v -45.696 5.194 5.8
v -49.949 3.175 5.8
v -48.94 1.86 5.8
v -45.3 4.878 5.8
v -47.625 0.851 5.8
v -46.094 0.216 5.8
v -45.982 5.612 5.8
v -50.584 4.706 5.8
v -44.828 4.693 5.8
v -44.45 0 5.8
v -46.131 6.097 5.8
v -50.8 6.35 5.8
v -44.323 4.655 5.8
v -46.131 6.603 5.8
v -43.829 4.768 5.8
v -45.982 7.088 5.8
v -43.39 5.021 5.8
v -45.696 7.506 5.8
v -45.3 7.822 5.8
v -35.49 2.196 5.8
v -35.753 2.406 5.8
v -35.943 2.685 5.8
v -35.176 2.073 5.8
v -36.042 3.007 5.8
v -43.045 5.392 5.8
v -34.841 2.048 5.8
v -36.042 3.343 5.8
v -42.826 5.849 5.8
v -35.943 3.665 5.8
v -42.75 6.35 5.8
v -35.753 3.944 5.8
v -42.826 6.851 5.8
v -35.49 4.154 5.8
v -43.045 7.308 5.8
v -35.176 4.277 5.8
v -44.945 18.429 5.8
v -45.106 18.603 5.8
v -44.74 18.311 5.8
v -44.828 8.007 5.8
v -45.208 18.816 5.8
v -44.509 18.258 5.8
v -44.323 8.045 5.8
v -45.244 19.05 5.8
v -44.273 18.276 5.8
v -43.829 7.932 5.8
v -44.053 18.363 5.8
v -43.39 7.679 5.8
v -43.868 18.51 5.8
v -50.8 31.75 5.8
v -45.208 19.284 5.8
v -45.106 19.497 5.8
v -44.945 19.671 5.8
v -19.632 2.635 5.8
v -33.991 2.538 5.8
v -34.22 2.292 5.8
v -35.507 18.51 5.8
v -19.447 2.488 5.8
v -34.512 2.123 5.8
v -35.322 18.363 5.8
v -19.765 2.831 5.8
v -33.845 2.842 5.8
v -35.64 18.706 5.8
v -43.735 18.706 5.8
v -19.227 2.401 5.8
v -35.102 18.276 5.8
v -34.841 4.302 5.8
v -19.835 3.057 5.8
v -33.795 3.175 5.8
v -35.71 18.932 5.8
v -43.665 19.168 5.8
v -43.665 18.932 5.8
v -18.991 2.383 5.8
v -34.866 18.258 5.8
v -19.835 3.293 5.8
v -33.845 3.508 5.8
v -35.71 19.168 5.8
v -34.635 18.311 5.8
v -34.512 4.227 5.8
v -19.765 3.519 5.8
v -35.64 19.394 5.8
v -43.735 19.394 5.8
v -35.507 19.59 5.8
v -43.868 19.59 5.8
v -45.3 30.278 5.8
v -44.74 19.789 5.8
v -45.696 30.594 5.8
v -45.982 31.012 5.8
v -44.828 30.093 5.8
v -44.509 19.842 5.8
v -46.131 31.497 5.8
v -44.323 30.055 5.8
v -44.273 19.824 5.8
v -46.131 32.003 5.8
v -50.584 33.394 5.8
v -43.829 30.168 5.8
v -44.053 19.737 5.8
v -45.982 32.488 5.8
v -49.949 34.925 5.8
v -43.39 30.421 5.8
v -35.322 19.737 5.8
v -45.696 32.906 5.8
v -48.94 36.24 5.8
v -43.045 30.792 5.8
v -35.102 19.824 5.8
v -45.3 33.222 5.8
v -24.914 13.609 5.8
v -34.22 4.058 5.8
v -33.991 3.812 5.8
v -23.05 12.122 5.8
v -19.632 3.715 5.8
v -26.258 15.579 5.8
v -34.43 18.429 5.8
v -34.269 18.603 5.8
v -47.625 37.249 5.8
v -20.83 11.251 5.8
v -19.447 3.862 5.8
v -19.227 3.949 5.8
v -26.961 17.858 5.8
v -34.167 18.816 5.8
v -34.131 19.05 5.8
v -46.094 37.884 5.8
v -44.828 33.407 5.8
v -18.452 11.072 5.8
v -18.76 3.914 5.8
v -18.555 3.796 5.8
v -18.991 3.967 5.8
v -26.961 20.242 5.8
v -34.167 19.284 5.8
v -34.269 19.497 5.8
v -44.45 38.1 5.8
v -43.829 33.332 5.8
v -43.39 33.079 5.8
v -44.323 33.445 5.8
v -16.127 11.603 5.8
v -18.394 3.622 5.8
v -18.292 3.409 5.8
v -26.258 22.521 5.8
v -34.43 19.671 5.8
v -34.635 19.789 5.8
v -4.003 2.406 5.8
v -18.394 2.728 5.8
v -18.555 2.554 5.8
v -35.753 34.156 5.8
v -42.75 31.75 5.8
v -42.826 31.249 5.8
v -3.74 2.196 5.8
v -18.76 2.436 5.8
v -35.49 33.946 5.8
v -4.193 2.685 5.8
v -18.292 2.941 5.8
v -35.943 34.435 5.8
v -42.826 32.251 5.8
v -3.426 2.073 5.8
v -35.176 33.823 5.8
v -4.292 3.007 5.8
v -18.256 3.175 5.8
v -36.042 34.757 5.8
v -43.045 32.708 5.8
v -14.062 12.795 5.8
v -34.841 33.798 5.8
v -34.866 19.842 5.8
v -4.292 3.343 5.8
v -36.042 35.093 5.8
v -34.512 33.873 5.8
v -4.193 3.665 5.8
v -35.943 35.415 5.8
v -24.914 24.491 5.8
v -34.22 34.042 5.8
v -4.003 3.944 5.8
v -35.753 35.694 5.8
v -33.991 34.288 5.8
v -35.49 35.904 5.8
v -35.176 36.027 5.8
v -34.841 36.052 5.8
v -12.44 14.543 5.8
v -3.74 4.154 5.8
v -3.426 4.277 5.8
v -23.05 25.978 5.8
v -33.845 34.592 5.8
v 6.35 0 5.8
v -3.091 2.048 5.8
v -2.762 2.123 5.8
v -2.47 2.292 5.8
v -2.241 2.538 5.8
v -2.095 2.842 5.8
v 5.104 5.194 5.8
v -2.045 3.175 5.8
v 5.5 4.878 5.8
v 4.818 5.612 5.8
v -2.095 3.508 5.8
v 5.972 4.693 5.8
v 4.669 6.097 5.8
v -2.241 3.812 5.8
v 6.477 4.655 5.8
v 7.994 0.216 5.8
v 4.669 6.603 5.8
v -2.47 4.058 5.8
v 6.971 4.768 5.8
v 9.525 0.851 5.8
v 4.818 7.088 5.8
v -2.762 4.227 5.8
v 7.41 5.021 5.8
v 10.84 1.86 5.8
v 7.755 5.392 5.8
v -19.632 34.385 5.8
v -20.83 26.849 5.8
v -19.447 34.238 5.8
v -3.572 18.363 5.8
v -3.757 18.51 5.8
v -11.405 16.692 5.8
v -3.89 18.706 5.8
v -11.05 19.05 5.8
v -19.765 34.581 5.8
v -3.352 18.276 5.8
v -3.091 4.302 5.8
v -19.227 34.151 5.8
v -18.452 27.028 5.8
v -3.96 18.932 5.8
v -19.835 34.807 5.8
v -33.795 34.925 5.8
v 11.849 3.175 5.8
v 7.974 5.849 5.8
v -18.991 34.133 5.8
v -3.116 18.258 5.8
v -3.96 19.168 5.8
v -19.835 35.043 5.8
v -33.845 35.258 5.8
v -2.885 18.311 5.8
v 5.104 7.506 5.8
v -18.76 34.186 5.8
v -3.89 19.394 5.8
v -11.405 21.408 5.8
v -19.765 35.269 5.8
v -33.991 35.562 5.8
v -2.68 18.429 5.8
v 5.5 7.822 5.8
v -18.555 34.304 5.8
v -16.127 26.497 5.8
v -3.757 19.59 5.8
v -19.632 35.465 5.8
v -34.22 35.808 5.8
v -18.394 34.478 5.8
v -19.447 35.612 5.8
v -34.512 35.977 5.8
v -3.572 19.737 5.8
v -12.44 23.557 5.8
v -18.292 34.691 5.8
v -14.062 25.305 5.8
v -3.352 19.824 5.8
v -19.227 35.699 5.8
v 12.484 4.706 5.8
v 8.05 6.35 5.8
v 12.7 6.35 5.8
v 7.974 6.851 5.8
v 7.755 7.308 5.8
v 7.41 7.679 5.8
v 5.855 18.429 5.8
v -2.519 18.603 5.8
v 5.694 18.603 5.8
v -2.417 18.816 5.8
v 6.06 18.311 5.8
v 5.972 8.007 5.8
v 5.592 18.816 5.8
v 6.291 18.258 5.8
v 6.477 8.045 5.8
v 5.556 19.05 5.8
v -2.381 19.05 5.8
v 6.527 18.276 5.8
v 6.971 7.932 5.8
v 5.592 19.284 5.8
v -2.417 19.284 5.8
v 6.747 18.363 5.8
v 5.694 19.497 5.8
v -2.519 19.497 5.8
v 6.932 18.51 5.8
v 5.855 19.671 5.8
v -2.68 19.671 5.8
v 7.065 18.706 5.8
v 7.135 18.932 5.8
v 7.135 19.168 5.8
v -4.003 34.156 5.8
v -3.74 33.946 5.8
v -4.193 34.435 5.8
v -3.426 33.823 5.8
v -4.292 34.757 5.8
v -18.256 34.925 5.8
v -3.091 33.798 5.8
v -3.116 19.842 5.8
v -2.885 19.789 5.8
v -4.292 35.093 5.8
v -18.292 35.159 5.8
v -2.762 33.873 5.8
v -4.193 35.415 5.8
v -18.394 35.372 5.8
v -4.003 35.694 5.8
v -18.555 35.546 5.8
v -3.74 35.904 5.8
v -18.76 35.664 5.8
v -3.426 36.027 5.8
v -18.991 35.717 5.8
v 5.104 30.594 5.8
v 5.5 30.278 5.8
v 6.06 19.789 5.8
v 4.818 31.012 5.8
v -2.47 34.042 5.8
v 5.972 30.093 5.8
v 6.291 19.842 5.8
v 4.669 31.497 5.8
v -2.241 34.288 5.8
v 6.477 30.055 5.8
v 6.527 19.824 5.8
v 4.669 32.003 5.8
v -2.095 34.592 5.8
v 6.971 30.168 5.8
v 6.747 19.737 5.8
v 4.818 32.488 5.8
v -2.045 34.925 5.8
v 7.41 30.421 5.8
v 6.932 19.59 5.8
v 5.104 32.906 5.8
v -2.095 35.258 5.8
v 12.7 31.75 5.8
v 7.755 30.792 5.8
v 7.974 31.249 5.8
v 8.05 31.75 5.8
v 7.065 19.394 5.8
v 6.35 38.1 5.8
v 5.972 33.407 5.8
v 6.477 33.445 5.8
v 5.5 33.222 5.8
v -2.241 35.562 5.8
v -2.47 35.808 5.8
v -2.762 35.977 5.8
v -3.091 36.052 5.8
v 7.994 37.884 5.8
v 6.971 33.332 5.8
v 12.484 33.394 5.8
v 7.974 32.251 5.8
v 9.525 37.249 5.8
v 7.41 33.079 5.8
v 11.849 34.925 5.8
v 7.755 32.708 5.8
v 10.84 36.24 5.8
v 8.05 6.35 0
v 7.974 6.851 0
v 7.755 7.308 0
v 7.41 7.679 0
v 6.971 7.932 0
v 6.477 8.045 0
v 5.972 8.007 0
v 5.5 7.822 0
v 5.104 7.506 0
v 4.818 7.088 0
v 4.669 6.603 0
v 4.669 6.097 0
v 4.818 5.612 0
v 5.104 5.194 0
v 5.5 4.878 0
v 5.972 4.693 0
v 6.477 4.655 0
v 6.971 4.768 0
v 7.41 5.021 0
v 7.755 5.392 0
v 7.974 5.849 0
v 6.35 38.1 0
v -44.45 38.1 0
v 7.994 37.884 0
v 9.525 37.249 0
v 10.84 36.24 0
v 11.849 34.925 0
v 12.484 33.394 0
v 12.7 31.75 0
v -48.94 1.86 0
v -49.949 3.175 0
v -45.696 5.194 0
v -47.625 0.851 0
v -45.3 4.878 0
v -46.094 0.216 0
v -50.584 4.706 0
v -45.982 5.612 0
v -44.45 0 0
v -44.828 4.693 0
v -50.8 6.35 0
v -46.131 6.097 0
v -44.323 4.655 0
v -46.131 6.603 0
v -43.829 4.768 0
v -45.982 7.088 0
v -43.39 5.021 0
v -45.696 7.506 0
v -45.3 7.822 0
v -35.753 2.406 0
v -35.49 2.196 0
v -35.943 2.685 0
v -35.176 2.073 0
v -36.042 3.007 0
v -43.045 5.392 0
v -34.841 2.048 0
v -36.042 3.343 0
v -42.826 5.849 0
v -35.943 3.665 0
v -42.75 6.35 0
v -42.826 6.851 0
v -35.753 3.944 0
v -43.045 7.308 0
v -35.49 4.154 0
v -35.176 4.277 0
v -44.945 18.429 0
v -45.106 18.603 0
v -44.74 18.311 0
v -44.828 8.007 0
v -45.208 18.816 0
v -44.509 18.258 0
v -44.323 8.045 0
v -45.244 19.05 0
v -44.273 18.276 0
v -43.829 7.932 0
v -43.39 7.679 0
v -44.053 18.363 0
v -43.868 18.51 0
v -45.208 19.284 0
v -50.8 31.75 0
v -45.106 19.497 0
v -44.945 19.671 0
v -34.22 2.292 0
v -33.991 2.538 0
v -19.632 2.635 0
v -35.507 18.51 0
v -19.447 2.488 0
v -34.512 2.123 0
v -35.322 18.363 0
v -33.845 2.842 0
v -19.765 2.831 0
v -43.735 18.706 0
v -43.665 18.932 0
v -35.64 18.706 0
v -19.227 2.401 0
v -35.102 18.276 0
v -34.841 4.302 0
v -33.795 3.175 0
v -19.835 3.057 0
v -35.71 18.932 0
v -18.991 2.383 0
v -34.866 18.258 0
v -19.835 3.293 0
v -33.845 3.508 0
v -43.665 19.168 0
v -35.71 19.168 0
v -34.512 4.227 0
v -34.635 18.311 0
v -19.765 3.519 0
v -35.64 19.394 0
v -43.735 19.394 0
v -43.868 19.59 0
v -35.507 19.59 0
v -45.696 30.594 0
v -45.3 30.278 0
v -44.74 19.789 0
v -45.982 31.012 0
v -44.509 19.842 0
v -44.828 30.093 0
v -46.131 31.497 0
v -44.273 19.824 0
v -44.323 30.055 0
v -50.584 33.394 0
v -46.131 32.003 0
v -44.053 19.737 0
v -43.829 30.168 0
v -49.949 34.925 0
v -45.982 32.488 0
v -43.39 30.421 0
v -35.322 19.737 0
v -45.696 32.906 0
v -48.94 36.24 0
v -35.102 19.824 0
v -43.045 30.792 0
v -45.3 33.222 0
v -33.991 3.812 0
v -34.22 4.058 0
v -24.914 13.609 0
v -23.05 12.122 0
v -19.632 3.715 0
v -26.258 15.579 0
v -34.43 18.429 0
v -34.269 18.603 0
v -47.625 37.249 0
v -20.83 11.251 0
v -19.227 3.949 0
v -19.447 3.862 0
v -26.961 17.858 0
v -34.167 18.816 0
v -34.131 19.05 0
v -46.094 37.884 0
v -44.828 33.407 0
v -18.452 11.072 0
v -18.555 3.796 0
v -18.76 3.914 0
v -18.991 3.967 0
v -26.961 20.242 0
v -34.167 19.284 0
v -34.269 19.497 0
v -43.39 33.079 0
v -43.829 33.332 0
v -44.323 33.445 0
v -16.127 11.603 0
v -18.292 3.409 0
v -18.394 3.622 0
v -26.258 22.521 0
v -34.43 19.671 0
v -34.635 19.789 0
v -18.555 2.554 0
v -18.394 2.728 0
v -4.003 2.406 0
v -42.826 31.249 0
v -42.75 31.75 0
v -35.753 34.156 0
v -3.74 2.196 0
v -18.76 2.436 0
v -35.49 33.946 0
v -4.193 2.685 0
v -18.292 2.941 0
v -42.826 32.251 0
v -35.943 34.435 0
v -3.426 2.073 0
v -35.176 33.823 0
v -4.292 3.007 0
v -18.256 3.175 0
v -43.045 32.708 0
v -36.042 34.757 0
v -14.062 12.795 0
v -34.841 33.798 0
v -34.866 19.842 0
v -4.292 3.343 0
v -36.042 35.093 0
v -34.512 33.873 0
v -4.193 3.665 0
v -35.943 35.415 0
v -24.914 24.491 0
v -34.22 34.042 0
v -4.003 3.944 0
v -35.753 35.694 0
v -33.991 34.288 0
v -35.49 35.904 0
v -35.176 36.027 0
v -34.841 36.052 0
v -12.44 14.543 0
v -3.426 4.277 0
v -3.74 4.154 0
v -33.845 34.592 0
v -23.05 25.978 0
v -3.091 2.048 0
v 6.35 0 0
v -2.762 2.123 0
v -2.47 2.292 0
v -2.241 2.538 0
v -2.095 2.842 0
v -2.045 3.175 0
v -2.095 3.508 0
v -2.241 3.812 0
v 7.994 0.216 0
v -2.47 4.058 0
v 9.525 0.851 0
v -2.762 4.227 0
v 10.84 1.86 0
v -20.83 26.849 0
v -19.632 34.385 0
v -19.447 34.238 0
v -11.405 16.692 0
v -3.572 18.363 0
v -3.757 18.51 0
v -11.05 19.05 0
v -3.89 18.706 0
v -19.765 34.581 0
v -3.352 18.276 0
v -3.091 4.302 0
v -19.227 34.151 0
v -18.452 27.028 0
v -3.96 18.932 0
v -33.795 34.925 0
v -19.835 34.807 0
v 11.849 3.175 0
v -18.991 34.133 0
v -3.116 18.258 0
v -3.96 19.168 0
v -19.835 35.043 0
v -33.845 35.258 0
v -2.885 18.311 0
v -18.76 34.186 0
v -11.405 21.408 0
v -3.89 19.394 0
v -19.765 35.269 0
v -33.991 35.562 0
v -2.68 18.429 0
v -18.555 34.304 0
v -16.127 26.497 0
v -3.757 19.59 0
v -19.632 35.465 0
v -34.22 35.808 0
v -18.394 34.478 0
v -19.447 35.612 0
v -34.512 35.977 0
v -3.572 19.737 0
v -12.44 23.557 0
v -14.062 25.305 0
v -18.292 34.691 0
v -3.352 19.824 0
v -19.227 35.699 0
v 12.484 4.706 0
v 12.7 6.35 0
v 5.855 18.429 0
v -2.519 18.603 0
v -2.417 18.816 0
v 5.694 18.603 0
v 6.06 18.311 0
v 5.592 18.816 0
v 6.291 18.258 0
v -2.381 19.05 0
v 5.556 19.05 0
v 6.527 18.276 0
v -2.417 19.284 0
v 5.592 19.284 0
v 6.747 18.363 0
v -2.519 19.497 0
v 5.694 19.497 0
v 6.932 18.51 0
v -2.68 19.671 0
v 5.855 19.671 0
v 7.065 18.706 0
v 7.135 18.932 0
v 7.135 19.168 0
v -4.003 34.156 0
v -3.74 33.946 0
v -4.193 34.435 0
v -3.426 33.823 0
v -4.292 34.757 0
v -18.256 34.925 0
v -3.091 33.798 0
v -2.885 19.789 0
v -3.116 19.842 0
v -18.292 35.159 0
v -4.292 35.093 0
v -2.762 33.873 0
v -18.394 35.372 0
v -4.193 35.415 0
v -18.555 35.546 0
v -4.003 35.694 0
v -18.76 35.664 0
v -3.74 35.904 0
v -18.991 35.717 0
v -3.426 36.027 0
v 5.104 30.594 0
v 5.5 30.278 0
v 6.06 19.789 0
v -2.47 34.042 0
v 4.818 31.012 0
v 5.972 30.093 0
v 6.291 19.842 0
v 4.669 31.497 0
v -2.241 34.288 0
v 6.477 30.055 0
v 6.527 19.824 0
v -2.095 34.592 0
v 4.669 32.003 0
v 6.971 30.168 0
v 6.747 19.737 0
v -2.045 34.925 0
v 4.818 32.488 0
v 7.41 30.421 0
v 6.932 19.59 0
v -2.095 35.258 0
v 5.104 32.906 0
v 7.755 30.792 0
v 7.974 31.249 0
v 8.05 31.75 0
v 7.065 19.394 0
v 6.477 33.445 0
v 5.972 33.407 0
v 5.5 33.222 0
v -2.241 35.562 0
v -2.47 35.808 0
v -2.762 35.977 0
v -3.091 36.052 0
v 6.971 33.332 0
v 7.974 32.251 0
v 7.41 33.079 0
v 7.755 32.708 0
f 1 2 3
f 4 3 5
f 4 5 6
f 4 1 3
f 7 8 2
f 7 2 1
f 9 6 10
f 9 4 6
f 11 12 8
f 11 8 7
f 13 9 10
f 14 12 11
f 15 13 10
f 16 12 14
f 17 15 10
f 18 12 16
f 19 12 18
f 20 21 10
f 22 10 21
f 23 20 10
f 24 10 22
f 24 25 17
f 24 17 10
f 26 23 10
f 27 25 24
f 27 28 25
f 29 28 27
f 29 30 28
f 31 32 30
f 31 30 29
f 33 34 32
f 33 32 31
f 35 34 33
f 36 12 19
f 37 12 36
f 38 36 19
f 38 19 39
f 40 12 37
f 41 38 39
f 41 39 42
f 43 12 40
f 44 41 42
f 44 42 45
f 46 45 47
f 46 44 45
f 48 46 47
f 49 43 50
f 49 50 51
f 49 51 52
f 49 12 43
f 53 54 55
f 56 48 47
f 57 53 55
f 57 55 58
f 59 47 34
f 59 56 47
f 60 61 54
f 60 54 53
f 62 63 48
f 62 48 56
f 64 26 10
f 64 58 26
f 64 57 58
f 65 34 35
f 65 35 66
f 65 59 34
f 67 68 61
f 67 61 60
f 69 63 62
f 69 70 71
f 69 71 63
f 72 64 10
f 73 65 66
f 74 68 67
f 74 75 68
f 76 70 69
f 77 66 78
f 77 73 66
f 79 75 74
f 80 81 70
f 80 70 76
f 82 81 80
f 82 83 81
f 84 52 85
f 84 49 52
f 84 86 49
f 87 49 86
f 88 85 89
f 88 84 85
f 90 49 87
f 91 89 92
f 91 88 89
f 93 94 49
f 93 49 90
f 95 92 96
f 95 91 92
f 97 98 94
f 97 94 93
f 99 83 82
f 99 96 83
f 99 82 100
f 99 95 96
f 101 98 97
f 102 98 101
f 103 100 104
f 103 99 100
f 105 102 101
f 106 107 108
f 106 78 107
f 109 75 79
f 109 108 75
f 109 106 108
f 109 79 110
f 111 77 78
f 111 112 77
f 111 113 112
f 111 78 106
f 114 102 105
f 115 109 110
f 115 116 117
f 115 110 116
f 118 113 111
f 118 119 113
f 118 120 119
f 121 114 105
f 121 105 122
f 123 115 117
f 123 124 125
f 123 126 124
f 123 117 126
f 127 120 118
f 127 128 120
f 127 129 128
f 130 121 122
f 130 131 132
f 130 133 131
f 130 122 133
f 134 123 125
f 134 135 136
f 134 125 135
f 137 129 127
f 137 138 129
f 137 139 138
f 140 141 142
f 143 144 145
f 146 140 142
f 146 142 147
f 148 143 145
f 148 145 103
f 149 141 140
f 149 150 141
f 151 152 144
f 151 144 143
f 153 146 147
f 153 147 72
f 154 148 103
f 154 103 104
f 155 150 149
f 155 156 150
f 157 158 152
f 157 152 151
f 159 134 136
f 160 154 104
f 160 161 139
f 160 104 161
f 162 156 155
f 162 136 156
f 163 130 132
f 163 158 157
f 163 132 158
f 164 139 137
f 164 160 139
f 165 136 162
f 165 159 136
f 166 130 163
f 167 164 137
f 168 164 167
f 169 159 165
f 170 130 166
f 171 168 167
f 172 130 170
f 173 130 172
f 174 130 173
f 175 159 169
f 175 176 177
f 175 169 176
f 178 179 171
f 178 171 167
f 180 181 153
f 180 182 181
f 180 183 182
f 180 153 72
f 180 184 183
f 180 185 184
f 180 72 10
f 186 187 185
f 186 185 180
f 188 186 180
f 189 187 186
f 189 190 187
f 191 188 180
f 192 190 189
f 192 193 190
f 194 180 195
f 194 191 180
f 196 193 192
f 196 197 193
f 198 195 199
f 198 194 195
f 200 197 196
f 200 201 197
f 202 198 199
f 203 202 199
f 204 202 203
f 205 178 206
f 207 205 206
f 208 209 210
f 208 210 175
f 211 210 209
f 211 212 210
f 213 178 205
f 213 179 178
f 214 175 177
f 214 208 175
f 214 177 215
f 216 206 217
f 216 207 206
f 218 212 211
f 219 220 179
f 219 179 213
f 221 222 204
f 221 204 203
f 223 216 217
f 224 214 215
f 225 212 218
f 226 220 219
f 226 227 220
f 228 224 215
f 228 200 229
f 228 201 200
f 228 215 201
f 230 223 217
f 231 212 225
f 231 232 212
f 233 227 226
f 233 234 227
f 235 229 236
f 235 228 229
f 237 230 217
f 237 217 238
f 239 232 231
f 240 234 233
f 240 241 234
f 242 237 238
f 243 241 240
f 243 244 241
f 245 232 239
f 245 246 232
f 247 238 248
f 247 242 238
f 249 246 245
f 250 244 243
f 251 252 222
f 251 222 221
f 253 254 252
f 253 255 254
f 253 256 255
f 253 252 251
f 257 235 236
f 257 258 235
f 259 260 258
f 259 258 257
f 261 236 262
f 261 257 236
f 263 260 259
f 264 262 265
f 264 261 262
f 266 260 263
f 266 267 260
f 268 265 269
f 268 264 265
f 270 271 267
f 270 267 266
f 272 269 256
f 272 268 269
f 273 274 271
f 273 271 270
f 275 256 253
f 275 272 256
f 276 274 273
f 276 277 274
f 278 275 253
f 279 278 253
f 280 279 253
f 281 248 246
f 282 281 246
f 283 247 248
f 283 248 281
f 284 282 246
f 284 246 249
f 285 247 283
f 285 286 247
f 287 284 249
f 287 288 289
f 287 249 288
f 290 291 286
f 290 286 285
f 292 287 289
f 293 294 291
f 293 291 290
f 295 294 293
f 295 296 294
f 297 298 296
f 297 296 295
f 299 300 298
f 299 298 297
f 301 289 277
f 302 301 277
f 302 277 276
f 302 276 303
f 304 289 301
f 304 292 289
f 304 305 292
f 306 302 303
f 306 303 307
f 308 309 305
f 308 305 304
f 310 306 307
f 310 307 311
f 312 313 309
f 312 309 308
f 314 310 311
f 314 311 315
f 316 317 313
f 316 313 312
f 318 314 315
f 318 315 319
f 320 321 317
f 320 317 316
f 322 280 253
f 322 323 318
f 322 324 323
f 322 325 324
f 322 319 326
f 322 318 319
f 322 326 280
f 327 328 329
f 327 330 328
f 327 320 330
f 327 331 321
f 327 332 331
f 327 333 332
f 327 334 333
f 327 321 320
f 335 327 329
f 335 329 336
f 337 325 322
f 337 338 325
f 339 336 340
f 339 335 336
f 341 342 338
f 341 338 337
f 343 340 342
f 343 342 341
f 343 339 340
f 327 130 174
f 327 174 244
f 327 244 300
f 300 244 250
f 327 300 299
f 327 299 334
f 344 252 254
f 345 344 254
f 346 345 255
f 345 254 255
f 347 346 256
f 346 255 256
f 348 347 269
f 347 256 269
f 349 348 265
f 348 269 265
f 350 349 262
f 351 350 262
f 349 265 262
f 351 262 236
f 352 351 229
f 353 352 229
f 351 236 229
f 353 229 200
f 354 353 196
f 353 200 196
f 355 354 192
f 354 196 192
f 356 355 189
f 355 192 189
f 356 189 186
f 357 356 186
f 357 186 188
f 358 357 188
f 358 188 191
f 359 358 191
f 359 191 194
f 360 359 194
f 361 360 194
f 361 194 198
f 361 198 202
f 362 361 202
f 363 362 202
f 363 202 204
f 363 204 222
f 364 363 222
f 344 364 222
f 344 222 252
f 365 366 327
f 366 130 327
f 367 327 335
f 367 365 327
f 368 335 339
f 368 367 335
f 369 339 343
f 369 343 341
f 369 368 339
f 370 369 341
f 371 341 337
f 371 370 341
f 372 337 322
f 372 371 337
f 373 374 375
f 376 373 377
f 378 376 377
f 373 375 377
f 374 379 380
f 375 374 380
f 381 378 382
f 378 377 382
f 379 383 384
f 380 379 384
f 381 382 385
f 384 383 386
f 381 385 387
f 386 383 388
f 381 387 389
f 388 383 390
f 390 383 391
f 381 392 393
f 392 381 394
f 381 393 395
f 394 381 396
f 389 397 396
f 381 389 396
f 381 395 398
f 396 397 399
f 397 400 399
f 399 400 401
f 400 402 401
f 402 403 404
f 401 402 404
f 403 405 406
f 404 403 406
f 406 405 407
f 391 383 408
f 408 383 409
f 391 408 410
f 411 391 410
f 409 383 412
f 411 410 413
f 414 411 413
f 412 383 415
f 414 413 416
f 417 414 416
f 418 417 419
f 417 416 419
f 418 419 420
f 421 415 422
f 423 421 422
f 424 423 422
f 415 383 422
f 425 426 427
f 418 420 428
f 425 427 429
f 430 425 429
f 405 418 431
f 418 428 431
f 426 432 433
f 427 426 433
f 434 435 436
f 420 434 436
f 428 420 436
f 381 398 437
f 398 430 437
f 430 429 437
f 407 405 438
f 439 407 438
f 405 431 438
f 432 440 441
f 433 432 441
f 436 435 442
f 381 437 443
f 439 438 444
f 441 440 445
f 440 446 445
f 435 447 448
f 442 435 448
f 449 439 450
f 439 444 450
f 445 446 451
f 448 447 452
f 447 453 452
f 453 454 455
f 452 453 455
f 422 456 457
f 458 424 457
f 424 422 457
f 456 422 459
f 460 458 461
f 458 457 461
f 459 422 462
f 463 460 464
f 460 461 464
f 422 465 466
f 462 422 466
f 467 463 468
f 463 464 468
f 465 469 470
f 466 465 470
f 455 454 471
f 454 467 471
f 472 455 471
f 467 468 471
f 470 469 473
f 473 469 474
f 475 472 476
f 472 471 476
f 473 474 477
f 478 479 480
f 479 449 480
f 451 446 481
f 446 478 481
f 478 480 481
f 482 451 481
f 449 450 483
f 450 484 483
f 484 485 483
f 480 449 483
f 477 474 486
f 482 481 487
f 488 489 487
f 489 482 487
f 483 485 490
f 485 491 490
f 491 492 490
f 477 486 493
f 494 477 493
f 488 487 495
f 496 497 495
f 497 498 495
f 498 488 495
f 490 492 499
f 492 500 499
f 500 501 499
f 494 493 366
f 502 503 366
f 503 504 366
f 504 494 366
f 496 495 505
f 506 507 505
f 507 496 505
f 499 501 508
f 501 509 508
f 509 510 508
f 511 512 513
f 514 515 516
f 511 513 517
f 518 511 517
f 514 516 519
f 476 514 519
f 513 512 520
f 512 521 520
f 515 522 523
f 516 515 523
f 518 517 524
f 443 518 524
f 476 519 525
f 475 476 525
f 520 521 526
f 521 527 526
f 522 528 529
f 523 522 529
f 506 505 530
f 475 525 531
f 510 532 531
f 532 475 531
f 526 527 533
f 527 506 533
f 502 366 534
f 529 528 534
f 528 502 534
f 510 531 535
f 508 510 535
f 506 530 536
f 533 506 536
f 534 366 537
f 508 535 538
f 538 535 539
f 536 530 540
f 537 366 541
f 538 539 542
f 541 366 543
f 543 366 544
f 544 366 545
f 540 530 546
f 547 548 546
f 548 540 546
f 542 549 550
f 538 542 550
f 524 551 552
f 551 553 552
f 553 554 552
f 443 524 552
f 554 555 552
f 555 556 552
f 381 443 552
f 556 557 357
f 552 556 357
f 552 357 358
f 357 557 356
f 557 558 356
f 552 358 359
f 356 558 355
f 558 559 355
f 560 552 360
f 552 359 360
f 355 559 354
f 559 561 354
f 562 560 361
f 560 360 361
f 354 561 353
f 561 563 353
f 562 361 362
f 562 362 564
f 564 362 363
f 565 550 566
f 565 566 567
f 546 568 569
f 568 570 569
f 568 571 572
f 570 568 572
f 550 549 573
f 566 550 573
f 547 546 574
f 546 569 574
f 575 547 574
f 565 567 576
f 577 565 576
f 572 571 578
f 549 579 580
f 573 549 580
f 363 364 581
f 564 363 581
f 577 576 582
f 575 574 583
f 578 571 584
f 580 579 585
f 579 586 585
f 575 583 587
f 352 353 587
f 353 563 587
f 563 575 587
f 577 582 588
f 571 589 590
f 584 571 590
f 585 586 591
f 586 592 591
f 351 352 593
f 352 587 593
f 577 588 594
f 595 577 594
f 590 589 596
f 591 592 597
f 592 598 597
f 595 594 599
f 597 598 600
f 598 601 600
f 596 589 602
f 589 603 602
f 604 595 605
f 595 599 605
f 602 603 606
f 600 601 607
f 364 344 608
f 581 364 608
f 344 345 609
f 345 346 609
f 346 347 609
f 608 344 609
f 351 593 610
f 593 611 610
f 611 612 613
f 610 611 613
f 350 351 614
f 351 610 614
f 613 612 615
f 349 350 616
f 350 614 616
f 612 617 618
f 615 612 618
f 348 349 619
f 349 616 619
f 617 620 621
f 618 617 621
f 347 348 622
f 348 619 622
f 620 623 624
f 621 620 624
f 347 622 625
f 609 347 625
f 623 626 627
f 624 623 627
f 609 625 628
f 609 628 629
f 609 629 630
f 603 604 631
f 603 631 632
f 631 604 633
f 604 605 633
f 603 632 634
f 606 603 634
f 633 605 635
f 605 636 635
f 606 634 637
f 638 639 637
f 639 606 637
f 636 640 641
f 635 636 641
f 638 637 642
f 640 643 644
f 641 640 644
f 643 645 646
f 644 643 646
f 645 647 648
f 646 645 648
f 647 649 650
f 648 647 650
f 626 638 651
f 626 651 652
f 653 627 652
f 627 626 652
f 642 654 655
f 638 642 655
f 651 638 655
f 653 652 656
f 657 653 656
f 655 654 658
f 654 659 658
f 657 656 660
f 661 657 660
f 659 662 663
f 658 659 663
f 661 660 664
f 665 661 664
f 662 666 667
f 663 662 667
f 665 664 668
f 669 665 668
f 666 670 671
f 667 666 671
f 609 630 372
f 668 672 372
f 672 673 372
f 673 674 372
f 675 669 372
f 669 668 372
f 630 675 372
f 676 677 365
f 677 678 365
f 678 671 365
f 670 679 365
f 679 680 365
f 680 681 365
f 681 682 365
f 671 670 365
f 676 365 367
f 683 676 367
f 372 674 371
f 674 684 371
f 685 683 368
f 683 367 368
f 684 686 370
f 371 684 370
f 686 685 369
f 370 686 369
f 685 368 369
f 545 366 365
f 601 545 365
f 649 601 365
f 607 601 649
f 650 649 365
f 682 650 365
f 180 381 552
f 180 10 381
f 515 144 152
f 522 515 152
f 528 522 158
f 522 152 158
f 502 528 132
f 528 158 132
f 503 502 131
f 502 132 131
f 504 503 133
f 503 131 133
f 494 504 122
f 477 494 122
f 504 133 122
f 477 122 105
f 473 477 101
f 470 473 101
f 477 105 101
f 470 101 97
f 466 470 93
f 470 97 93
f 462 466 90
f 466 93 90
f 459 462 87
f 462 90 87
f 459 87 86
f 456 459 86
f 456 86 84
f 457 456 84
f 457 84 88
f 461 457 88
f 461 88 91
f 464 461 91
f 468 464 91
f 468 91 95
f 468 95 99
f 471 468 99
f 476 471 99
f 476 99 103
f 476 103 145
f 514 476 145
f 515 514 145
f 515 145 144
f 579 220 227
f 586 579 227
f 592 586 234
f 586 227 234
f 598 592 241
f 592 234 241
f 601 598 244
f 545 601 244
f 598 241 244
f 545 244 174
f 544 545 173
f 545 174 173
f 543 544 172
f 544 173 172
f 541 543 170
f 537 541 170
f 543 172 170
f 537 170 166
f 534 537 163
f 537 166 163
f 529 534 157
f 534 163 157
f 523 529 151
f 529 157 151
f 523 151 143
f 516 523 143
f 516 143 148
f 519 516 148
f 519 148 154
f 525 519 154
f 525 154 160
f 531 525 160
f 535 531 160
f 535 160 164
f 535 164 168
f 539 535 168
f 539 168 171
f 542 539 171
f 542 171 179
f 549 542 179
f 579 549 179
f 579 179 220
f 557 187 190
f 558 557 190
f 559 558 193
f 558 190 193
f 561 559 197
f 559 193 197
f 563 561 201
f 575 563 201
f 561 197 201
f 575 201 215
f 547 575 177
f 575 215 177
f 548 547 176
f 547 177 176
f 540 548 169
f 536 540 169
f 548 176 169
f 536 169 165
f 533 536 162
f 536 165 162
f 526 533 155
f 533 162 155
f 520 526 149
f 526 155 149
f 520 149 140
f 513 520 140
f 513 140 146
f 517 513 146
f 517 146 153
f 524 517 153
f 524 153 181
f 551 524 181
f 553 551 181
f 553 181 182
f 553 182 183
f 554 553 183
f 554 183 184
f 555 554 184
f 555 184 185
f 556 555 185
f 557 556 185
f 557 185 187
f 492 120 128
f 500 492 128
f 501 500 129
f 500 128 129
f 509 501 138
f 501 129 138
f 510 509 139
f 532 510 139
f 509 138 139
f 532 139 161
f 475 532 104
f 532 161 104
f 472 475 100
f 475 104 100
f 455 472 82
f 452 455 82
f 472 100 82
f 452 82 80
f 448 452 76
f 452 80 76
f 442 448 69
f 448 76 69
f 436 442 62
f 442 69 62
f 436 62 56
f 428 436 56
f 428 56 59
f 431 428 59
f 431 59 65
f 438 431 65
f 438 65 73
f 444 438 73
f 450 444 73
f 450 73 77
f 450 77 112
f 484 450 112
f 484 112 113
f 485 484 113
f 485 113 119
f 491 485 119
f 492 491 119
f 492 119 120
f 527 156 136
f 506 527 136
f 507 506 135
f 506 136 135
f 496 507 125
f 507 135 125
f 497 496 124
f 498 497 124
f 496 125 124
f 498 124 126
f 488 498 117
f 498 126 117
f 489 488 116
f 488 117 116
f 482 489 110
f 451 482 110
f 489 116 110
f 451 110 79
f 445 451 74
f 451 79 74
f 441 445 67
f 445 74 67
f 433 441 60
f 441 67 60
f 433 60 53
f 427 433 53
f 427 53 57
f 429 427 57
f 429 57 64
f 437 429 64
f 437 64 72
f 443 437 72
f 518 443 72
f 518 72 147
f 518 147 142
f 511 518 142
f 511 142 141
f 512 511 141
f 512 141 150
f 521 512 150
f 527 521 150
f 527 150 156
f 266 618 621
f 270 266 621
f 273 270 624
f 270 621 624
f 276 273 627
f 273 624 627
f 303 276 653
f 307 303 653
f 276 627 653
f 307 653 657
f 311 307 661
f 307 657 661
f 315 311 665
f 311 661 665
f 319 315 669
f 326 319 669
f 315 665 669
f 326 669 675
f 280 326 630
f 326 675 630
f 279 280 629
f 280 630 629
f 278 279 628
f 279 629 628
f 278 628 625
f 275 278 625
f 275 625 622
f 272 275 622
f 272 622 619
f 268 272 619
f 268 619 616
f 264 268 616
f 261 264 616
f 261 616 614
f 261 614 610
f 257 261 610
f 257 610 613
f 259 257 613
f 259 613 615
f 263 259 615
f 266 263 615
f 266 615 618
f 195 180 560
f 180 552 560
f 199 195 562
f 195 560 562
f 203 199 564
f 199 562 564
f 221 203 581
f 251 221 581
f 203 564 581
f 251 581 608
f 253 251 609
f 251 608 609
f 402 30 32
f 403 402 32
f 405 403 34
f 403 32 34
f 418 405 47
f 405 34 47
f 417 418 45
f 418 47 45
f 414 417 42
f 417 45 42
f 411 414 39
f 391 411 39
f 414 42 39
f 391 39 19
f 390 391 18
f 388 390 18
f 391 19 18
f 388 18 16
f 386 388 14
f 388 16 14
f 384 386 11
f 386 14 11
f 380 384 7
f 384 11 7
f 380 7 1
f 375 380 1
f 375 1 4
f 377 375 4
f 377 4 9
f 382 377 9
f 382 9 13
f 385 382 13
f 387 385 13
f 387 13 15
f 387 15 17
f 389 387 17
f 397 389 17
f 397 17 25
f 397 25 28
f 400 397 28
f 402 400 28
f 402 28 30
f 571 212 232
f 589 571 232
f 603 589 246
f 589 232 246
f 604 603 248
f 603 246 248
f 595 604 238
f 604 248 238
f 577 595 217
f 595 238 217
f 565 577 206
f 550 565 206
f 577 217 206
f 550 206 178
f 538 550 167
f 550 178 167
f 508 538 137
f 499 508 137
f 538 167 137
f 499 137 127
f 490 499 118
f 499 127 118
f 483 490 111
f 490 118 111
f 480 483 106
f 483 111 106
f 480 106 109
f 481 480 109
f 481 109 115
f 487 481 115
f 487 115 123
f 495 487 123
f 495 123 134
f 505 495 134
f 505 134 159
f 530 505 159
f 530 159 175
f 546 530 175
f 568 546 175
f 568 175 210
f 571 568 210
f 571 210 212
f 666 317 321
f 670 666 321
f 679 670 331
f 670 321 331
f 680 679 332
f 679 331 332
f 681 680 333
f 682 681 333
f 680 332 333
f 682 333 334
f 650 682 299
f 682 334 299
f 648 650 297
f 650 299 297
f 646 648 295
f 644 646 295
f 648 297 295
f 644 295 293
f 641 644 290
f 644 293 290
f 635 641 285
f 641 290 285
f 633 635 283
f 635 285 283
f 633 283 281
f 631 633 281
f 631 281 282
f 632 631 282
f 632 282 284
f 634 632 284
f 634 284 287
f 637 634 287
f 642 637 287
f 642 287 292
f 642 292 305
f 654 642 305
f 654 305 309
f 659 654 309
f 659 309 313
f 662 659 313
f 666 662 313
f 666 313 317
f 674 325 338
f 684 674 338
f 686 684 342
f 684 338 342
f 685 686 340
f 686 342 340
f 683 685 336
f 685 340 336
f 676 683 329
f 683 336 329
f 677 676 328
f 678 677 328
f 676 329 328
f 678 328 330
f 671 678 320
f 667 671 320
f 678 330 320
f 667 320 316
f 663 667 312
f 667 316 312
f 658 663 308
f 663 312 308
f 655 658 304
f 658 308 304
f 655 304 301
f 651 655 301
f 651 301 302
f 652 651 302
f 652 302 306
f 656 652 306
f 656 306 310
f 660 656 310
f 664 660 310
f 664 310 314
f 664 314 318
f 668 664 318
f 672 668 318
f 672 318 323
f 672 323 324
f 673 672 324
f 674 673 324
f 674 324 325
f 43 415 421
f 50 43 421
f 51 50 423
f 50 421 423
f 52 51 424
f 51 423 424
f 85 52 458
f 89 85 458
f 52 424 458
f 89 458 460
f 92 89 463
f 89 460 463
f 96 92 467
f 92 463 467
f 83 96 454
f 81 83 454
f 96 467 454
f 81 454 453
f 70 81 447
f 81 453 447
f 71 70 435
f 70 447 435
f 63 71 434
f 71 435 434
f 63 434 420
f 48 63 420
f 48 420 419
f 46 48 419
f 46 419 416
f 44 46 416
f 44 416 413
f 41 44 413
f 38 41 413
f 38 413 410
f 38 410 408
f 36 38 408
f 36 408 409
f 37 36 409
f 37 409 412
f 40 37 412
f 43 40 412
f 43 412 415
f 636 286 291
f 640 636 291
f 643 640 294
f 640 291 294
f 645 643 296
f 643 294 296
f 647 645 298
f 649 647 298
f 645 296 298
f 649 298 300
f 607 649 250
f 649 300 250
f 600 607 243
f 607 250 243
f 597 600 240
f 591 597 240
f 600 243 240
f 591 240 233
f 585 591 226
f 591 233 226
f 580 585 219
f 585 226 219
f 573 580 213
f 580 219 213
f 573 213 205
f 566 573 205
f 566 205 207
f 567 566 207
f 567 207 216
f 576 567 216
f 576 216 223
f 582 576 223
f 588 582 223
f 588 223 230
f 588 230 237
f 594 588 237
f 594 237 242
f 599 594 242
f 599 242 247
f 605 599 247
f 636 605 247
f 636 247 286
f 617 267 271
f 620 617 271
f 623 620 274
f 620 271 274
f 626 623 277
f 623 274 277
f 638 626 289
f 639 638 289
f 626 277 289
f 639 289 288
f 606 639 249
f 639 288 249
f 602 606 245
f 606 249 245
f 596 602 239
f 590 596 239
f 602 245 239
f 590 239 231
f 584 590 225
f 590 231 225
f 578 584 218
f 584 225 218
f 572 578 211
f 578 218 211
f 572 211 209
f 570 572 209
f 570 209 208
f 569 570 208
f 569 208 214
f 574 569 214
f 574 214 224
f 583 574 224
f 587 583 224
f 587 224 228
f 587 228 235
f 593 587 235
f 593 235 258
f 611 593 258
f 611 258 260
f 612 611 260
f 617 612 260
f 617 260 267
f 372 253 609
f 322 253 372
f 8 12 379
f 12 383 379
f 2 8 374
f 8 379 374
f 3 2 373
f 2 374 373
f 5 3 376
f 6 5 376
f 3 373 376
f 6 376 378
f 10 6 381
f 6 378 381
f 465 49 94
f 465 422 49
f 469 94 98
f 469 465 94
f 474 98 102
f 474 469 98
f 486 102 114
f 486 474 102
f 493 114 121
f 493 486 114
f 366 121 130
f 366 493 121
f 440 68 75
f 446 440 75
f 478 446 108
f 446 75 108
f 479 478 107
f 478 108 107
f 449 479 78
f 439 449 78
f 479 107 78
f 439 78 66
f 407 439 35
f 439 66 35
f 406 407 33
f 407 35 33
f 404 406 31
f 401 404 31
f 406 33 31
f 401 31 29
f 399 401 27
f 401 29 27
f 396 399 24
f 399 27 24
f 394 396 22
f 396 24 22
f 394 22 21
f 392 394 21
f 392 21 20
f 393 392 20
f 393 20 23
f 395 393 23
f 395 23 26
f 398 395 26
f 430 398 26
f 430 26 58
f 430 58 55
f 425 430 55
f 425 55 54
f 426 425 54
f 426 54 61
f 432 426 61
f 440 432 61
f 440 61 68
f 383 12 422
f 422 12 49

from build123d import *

# Parameters (mm, degrees)
SKETCH1_W                = 38.1
SKETCH1_H                = 38.1
BOSS_EXTRUDE1_DEPTH      = 5.8
SKETCH2_R                = 8
CUT_EXTRUDE1_DEPTH       = 12.7
SKETCH3_R                = 1.13
CUT_EXTRUDE2_DEPTH       = 55.19280395
SKETCH4_R                = 0.79375
CUT_EXTRUDE3_DEPTH       = 55.19280395
SKETCH5_W                = 12.7
SKETCH5_H                = 38.1
BOSS_EXTRUDE2_DEPTH      = 5.8
M3_CLEARANCE_HOLE1_D     = 3.4
M3_CLEARANCE_HOLE1_DEPTH = 10
M3_CLEARANCE_HOLE1_TIP   = 1.021463052
SKETCH9_R                = 0.79375
CUT_EXTRUDE4_DEPTH       = 64.764331722
FILLET1_R                = 6.35


with BuildPart() as part:
    # Sketch1 → Boss-Extrude1 (new body)
    with BuildSketch(Plane.XY):
        with Locations((-19.05, 19.05)):
            Rectangle(SKETCH1_W, SKETCH1_H)
    extrude(amount=BOSS_EXTRUDE1_DEPTH)

    # Sketch2 → Cut-Extrude1 (cut)
    with BuildSketch(Plane.XY.offset(5.8)):
        with Locations((-19.05, 19.05)):
            Circle(SKETCH2_R)
    extrude(amount=-CUT_EXTRUDE1_DEPTH, mode=Mode.SUBTRACT)

    # Sketch3 → Cut-Extrude2 (cut, through all)
    with BuildSketch(Plane.XY.offset(5.8)):
        with Locations((-34.925, 34.925)):
            Circle(SKETCH3_R)
        with Locations((-3.175, 34.925)):
            Circle(SKETCH3_R)
        with Locations((-3.175, 3.175)):
            Circle(SKETCH3_R)
        with Locations((-34.925, 3.175)):
            Circle(SKETCH3_R)
    extrude(amount=-CUT_EXTRUDE2_DEPTH, mode=Mode.SUBTRACT)

    # Sketch4 → Cut-Extrude3 (cut, through all)
    with BuildSketch(Plane.XY.offset(5.8)):
        with Locations((-34.925, 19.05)):
            Circle(SKETCH4_R)
        with Locations((-19.05, 34.925)):
            Circle(SKETCH4_R)
        with Locations((-3.175, 19.05)):
            Circle(SKETCH4_R)
        with Locations((-19.05, 3.175)):
            Circle(SKETCH4_R)
    extrude(amount=-CUT_EXTRUDE3_DEPTH, mode=Mode.SUBTRACT)

    # Sketch5 → Boss-Extrude2 (add, through all)
    with BuildSketch(Plane.XY.offset(5.8)):
        with Locations((-44.45, 19.05)):
            Rectangle(SKETCH5_W, SKETCH5_H)
        with Locations((6.35, 19.05)):
            Rectangle(SKETCH5_W, SKETCH5_H)
    extrude(amount=-BOSS_EXTRUDE2_DEPTH)

    # M3 Clearance Hole1
    with Locations(Plane(origin=(0, 0, 0), x_dir=(-1, 0, 0), z_dir=(0, 0, -1))):
        with Locations((-6.35, 31.75), (44.45, 31.75), (44.45, 6.35), (-6.35, 6.35)):
            Hole(M3_CLEARANCE_HOLE1_D / 2, depth=M3_CLEARANCE_HOLE1_DEPTH)
            with Locations((0, 0, -(M3_CLEARANCE_HOLE1_DEPTH + M3_CLEARANCE_HOLE1_TIP / 2))):  # 118° drill point
                Cone(0, M3_CLEARANCE_HOLE1_D / 2, M3_CLEARANCE_HOLE1_TIP, mode=Mode.SUBTRACT)

    # Sketch9 → Cut-Extrude4 (cut, through all)
    with BuildSketch(Plane(origin=(0, 0, 0), x_dir=(-1, 0, 0), z_dir=(0, 0, -1))):
        with Locations((-6.35, 19.05)):
            Circle(SKETCH9_R)
        with Locations((44.45, 19.05)):
            Circle(SKETCH9_R)
    extrude(amount=-CUT_EXTRUDE4_DEPTH, mode=Mode.SUBTRACT)

    # Fillet1
    fillet1_edges = [part.edges().sort_by_distance(p)[0] for p in [
        (-50.8, 0, 2.9),
        (-50.8, 38.1, 2.9),
        (12.7, 38.1, 2.9),
        (12.7, 0, 2.9),
    ]]
    fillet(fillet1_edges, radius=FILLET1_R)


solid = part.part
